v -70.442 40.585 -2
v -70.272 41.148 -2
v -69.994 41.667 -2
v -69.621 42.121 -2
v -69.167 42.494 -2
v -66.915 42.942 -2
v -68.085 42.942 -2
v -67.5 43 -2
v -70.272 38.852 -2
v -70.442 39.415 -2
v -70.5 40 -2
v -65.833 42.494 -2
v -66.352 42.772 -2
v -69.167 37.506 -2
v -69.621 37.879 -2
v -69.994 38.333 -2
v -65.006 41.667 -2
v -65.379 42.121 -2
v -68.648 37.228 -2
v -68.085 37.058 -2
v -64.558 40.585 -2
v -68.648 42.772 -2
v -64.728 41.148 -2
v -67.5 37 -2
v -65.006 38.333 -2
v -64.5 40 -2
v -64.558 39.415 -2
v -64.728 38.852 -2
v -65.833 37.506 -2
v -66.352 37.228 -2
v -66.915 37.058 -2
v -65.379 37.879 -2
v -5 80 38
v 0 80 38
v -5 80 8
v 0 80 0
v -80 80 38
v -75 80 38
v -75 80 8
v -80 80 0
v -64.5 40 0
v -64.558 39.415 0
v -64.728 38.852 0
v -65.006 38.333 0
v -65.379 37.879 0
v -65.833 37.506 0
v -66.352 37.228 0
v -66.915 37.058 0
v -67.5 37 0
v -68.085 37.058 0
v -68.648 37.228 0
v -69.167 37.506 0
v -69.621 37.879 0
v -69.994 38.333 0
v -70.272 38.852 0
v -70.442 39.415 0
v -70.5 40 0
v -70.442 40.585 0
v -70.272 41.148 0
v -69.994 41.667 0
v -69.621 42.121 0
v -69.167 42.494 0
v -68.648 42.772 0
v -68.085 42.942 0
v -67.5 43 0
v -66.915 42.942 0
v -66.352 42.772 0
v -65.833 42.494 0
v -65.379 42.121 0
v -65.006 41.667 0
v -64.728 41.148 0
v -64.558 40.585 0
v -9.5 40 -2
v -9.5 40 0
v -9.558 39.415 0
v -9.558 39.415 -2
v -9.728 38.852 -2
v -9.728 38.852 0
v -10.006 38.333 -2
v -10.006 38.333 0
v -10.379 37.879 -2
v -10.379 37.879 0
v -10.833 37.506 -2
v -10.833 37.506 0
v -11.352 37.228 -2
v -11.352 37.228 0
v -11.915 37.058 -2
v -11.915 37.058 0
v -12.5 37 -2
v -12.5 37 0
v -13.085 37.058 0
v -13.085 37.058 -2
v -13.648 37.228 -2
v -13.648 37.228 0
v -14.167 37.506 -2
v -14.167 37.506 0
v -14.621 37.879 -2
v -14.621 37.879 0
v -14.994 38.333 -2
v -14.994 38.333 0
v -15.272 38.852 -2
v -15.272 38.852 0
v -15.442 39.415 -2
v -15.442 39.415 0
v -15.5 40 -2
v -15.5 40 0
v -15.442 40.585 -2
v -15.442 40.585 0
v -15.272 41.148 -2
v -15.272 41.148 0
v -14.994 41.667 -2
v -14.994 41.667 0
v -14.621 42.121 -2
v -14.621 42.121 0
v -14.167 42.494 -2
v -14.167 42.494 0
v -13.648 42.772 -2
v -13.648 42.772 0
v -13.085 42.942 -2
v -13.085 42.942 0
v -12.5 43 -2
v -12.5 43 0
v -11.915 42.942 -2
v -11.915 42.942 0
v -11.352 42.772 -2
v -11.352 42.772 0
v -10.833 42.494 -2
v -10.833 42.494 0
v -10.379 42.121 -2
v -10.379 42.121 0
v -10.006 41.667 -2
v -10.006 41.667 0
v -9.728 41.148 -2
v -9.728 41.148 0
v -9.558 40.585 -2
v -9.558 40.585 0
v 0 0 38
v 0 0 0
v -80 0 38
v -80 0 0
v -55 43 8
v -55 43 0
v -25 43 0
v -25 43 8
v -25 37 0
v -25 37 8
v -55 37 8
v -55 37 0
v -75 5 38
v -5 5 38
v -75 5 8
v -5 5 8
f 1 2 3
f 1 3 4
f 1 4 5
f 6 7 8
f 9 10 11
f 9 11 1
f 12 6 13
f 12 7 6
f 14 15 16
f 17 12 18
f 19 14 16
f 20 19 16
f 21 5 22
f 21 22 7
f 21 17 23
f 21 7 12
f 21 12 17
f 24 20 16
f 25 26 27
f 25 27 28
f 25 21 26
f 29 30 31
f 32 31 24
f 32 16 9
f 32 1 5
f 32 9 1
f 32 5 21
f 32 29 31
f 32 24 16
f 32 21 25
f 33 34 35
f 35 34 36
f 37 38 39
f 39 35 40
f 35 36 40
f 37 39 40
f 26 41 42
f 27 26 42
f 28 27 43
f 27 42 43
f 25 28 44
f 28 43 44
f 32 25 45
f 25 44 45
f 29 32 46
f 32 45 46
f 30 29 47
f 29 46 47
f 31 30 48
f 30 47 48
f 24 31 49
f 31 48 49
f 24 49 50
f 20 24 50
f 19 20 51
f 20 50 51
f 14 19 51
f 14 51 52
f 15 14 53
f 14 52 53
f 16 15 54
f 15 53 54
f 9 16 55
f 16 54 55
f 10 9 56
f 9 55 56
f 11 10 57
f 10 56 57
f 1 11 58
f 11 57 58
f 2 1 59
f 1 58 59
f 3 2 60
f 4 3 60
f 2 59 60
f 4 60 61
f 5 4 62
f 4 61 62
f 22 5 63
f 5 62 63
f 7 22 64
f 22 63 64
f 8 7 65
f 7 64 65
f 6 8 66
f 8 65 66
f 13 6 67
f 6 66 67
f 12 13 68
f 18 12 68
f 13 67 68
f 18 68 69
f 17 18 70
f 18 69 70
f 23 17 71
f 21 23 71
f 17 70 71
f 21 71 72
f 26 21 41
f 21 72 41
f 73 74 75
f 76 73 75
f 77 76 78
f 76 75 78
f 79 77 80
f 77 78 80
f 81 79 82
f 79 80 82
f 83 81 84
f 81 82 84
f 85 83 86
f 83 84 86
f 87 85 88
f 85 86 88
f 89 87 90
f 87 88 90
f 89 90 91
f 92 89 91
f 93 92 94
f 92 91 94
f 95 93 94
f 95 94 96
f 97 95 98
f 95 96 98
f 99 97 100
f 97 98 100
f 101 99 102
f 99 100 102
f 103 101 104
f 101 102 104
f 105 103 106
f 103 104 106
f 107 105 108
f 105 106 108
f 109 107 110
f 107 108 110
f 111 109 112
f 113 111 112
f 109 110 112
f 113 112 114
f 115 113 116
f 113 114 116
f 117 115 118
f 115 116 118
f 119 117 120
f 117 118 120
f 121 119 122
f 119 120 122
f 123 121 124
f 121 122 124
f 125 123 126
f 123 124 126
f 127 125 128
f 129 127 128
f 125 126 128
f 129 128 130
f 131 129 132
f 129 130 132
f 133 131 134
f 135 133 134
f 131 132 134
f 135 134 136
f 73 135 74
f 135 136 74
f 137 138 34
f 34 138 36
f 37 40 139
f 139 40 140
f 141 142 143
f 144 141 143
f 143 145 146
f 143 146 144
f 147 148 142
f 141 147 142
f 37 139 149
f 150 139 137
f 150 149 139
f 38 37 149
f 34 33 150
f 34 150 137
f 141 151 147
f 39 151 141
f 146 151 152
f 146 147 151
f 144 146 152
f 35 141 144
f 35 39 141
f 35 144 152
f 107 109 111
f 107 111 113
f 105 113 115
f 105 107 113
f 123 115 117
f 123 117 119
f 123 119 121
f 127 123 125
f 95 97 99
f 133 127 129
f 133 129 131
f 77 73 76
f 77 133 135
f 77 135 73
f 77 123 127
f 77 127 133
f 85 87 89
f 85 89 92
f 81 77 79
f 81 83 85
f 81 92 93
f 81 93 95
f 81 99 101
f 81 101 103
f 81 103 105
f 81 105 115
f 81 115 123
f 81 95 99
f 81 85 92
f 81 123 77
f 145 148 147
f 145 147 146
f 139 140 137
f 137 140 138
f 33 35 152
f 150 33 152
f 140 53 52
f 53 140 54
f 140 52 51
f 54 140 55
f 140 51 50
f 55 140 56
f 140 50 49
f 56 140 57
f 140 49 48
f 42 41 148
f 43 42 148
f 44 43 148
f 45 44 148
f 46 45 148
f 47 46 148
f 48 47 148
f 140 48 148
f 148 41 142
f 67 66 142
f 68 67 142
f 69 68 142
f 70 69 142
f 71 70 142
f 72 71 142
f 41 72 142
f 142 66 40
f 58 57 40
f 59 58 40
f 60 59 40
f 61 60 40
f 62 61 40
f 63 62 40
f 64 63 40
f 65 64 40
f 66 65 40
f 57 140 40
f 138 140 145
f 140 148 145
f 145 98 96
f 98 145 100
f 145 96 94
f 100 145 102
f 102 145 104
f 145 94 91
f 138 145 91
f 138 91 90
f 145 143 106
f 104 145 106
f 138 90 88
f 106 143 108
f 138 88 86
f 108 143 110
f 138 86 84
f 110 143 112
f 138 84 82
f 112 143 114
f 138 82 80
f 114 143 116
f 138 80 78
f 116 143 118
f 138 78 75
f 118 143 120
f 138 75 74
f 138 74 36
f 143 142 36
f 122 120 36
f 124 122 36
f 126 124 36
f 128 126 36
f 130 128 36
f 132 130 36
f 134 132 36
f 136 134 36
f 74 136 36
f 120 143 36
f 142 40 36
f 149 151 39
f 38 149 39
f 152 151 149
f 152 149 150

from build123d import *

# Parameters (mm, degrees)
F0_W     = 80
F0_H     = 80
F0_W_2   = 30
F0_H_2   = 6
F1_DEPTH = 8
F2_W     = 70
F2_H     = 5
F3_DEPTH = 30
F4_R     = 3
F5_DEPTH = 2


with BuildPart() as f1:
    # F0 (on Top) → F1 (new body)
    with BuildSketch(Plane.XY):
        with Locations((-40, 40)):
            Rectangle(F0_W, F0_H)
        with Locations((-40, 40)):
            Rectangle(F0_W_2, F0_H_2, mode=Mode.SUBTRACT)
    extrude(amount=F1_DEPTH)

    # F2 (on face) → F3 (join)
    with BuildSketch(Plane.XY.offset(8)):
        Polygon((-80, 80), (-80, 0), (-75, 0), (-75, 5), (-75, 80), align=None)
        with Locations((-40, 2.5)):
            Rectangle(F2_W, F2_H)
        Polygon((-5, 5), (-5, 0), (0, 0), (0, 80), (-5, 80), align=None)
    extrude(amount=F3_DEPTH)

    # F4 (on face) → F5 (join)
    with BuildSketch(Plane(origin=(0, 0, 0), x_dir=(1, 0, 0), z_dir=(0, 0, -1))):
        with Locations((-67.5, -40)):
            Circle(F4_R)
        with Locations((-12.5, -40)):
            Circle(F4_R)
    extrude(amount=F5_DEPTH)


solid = f1.part
